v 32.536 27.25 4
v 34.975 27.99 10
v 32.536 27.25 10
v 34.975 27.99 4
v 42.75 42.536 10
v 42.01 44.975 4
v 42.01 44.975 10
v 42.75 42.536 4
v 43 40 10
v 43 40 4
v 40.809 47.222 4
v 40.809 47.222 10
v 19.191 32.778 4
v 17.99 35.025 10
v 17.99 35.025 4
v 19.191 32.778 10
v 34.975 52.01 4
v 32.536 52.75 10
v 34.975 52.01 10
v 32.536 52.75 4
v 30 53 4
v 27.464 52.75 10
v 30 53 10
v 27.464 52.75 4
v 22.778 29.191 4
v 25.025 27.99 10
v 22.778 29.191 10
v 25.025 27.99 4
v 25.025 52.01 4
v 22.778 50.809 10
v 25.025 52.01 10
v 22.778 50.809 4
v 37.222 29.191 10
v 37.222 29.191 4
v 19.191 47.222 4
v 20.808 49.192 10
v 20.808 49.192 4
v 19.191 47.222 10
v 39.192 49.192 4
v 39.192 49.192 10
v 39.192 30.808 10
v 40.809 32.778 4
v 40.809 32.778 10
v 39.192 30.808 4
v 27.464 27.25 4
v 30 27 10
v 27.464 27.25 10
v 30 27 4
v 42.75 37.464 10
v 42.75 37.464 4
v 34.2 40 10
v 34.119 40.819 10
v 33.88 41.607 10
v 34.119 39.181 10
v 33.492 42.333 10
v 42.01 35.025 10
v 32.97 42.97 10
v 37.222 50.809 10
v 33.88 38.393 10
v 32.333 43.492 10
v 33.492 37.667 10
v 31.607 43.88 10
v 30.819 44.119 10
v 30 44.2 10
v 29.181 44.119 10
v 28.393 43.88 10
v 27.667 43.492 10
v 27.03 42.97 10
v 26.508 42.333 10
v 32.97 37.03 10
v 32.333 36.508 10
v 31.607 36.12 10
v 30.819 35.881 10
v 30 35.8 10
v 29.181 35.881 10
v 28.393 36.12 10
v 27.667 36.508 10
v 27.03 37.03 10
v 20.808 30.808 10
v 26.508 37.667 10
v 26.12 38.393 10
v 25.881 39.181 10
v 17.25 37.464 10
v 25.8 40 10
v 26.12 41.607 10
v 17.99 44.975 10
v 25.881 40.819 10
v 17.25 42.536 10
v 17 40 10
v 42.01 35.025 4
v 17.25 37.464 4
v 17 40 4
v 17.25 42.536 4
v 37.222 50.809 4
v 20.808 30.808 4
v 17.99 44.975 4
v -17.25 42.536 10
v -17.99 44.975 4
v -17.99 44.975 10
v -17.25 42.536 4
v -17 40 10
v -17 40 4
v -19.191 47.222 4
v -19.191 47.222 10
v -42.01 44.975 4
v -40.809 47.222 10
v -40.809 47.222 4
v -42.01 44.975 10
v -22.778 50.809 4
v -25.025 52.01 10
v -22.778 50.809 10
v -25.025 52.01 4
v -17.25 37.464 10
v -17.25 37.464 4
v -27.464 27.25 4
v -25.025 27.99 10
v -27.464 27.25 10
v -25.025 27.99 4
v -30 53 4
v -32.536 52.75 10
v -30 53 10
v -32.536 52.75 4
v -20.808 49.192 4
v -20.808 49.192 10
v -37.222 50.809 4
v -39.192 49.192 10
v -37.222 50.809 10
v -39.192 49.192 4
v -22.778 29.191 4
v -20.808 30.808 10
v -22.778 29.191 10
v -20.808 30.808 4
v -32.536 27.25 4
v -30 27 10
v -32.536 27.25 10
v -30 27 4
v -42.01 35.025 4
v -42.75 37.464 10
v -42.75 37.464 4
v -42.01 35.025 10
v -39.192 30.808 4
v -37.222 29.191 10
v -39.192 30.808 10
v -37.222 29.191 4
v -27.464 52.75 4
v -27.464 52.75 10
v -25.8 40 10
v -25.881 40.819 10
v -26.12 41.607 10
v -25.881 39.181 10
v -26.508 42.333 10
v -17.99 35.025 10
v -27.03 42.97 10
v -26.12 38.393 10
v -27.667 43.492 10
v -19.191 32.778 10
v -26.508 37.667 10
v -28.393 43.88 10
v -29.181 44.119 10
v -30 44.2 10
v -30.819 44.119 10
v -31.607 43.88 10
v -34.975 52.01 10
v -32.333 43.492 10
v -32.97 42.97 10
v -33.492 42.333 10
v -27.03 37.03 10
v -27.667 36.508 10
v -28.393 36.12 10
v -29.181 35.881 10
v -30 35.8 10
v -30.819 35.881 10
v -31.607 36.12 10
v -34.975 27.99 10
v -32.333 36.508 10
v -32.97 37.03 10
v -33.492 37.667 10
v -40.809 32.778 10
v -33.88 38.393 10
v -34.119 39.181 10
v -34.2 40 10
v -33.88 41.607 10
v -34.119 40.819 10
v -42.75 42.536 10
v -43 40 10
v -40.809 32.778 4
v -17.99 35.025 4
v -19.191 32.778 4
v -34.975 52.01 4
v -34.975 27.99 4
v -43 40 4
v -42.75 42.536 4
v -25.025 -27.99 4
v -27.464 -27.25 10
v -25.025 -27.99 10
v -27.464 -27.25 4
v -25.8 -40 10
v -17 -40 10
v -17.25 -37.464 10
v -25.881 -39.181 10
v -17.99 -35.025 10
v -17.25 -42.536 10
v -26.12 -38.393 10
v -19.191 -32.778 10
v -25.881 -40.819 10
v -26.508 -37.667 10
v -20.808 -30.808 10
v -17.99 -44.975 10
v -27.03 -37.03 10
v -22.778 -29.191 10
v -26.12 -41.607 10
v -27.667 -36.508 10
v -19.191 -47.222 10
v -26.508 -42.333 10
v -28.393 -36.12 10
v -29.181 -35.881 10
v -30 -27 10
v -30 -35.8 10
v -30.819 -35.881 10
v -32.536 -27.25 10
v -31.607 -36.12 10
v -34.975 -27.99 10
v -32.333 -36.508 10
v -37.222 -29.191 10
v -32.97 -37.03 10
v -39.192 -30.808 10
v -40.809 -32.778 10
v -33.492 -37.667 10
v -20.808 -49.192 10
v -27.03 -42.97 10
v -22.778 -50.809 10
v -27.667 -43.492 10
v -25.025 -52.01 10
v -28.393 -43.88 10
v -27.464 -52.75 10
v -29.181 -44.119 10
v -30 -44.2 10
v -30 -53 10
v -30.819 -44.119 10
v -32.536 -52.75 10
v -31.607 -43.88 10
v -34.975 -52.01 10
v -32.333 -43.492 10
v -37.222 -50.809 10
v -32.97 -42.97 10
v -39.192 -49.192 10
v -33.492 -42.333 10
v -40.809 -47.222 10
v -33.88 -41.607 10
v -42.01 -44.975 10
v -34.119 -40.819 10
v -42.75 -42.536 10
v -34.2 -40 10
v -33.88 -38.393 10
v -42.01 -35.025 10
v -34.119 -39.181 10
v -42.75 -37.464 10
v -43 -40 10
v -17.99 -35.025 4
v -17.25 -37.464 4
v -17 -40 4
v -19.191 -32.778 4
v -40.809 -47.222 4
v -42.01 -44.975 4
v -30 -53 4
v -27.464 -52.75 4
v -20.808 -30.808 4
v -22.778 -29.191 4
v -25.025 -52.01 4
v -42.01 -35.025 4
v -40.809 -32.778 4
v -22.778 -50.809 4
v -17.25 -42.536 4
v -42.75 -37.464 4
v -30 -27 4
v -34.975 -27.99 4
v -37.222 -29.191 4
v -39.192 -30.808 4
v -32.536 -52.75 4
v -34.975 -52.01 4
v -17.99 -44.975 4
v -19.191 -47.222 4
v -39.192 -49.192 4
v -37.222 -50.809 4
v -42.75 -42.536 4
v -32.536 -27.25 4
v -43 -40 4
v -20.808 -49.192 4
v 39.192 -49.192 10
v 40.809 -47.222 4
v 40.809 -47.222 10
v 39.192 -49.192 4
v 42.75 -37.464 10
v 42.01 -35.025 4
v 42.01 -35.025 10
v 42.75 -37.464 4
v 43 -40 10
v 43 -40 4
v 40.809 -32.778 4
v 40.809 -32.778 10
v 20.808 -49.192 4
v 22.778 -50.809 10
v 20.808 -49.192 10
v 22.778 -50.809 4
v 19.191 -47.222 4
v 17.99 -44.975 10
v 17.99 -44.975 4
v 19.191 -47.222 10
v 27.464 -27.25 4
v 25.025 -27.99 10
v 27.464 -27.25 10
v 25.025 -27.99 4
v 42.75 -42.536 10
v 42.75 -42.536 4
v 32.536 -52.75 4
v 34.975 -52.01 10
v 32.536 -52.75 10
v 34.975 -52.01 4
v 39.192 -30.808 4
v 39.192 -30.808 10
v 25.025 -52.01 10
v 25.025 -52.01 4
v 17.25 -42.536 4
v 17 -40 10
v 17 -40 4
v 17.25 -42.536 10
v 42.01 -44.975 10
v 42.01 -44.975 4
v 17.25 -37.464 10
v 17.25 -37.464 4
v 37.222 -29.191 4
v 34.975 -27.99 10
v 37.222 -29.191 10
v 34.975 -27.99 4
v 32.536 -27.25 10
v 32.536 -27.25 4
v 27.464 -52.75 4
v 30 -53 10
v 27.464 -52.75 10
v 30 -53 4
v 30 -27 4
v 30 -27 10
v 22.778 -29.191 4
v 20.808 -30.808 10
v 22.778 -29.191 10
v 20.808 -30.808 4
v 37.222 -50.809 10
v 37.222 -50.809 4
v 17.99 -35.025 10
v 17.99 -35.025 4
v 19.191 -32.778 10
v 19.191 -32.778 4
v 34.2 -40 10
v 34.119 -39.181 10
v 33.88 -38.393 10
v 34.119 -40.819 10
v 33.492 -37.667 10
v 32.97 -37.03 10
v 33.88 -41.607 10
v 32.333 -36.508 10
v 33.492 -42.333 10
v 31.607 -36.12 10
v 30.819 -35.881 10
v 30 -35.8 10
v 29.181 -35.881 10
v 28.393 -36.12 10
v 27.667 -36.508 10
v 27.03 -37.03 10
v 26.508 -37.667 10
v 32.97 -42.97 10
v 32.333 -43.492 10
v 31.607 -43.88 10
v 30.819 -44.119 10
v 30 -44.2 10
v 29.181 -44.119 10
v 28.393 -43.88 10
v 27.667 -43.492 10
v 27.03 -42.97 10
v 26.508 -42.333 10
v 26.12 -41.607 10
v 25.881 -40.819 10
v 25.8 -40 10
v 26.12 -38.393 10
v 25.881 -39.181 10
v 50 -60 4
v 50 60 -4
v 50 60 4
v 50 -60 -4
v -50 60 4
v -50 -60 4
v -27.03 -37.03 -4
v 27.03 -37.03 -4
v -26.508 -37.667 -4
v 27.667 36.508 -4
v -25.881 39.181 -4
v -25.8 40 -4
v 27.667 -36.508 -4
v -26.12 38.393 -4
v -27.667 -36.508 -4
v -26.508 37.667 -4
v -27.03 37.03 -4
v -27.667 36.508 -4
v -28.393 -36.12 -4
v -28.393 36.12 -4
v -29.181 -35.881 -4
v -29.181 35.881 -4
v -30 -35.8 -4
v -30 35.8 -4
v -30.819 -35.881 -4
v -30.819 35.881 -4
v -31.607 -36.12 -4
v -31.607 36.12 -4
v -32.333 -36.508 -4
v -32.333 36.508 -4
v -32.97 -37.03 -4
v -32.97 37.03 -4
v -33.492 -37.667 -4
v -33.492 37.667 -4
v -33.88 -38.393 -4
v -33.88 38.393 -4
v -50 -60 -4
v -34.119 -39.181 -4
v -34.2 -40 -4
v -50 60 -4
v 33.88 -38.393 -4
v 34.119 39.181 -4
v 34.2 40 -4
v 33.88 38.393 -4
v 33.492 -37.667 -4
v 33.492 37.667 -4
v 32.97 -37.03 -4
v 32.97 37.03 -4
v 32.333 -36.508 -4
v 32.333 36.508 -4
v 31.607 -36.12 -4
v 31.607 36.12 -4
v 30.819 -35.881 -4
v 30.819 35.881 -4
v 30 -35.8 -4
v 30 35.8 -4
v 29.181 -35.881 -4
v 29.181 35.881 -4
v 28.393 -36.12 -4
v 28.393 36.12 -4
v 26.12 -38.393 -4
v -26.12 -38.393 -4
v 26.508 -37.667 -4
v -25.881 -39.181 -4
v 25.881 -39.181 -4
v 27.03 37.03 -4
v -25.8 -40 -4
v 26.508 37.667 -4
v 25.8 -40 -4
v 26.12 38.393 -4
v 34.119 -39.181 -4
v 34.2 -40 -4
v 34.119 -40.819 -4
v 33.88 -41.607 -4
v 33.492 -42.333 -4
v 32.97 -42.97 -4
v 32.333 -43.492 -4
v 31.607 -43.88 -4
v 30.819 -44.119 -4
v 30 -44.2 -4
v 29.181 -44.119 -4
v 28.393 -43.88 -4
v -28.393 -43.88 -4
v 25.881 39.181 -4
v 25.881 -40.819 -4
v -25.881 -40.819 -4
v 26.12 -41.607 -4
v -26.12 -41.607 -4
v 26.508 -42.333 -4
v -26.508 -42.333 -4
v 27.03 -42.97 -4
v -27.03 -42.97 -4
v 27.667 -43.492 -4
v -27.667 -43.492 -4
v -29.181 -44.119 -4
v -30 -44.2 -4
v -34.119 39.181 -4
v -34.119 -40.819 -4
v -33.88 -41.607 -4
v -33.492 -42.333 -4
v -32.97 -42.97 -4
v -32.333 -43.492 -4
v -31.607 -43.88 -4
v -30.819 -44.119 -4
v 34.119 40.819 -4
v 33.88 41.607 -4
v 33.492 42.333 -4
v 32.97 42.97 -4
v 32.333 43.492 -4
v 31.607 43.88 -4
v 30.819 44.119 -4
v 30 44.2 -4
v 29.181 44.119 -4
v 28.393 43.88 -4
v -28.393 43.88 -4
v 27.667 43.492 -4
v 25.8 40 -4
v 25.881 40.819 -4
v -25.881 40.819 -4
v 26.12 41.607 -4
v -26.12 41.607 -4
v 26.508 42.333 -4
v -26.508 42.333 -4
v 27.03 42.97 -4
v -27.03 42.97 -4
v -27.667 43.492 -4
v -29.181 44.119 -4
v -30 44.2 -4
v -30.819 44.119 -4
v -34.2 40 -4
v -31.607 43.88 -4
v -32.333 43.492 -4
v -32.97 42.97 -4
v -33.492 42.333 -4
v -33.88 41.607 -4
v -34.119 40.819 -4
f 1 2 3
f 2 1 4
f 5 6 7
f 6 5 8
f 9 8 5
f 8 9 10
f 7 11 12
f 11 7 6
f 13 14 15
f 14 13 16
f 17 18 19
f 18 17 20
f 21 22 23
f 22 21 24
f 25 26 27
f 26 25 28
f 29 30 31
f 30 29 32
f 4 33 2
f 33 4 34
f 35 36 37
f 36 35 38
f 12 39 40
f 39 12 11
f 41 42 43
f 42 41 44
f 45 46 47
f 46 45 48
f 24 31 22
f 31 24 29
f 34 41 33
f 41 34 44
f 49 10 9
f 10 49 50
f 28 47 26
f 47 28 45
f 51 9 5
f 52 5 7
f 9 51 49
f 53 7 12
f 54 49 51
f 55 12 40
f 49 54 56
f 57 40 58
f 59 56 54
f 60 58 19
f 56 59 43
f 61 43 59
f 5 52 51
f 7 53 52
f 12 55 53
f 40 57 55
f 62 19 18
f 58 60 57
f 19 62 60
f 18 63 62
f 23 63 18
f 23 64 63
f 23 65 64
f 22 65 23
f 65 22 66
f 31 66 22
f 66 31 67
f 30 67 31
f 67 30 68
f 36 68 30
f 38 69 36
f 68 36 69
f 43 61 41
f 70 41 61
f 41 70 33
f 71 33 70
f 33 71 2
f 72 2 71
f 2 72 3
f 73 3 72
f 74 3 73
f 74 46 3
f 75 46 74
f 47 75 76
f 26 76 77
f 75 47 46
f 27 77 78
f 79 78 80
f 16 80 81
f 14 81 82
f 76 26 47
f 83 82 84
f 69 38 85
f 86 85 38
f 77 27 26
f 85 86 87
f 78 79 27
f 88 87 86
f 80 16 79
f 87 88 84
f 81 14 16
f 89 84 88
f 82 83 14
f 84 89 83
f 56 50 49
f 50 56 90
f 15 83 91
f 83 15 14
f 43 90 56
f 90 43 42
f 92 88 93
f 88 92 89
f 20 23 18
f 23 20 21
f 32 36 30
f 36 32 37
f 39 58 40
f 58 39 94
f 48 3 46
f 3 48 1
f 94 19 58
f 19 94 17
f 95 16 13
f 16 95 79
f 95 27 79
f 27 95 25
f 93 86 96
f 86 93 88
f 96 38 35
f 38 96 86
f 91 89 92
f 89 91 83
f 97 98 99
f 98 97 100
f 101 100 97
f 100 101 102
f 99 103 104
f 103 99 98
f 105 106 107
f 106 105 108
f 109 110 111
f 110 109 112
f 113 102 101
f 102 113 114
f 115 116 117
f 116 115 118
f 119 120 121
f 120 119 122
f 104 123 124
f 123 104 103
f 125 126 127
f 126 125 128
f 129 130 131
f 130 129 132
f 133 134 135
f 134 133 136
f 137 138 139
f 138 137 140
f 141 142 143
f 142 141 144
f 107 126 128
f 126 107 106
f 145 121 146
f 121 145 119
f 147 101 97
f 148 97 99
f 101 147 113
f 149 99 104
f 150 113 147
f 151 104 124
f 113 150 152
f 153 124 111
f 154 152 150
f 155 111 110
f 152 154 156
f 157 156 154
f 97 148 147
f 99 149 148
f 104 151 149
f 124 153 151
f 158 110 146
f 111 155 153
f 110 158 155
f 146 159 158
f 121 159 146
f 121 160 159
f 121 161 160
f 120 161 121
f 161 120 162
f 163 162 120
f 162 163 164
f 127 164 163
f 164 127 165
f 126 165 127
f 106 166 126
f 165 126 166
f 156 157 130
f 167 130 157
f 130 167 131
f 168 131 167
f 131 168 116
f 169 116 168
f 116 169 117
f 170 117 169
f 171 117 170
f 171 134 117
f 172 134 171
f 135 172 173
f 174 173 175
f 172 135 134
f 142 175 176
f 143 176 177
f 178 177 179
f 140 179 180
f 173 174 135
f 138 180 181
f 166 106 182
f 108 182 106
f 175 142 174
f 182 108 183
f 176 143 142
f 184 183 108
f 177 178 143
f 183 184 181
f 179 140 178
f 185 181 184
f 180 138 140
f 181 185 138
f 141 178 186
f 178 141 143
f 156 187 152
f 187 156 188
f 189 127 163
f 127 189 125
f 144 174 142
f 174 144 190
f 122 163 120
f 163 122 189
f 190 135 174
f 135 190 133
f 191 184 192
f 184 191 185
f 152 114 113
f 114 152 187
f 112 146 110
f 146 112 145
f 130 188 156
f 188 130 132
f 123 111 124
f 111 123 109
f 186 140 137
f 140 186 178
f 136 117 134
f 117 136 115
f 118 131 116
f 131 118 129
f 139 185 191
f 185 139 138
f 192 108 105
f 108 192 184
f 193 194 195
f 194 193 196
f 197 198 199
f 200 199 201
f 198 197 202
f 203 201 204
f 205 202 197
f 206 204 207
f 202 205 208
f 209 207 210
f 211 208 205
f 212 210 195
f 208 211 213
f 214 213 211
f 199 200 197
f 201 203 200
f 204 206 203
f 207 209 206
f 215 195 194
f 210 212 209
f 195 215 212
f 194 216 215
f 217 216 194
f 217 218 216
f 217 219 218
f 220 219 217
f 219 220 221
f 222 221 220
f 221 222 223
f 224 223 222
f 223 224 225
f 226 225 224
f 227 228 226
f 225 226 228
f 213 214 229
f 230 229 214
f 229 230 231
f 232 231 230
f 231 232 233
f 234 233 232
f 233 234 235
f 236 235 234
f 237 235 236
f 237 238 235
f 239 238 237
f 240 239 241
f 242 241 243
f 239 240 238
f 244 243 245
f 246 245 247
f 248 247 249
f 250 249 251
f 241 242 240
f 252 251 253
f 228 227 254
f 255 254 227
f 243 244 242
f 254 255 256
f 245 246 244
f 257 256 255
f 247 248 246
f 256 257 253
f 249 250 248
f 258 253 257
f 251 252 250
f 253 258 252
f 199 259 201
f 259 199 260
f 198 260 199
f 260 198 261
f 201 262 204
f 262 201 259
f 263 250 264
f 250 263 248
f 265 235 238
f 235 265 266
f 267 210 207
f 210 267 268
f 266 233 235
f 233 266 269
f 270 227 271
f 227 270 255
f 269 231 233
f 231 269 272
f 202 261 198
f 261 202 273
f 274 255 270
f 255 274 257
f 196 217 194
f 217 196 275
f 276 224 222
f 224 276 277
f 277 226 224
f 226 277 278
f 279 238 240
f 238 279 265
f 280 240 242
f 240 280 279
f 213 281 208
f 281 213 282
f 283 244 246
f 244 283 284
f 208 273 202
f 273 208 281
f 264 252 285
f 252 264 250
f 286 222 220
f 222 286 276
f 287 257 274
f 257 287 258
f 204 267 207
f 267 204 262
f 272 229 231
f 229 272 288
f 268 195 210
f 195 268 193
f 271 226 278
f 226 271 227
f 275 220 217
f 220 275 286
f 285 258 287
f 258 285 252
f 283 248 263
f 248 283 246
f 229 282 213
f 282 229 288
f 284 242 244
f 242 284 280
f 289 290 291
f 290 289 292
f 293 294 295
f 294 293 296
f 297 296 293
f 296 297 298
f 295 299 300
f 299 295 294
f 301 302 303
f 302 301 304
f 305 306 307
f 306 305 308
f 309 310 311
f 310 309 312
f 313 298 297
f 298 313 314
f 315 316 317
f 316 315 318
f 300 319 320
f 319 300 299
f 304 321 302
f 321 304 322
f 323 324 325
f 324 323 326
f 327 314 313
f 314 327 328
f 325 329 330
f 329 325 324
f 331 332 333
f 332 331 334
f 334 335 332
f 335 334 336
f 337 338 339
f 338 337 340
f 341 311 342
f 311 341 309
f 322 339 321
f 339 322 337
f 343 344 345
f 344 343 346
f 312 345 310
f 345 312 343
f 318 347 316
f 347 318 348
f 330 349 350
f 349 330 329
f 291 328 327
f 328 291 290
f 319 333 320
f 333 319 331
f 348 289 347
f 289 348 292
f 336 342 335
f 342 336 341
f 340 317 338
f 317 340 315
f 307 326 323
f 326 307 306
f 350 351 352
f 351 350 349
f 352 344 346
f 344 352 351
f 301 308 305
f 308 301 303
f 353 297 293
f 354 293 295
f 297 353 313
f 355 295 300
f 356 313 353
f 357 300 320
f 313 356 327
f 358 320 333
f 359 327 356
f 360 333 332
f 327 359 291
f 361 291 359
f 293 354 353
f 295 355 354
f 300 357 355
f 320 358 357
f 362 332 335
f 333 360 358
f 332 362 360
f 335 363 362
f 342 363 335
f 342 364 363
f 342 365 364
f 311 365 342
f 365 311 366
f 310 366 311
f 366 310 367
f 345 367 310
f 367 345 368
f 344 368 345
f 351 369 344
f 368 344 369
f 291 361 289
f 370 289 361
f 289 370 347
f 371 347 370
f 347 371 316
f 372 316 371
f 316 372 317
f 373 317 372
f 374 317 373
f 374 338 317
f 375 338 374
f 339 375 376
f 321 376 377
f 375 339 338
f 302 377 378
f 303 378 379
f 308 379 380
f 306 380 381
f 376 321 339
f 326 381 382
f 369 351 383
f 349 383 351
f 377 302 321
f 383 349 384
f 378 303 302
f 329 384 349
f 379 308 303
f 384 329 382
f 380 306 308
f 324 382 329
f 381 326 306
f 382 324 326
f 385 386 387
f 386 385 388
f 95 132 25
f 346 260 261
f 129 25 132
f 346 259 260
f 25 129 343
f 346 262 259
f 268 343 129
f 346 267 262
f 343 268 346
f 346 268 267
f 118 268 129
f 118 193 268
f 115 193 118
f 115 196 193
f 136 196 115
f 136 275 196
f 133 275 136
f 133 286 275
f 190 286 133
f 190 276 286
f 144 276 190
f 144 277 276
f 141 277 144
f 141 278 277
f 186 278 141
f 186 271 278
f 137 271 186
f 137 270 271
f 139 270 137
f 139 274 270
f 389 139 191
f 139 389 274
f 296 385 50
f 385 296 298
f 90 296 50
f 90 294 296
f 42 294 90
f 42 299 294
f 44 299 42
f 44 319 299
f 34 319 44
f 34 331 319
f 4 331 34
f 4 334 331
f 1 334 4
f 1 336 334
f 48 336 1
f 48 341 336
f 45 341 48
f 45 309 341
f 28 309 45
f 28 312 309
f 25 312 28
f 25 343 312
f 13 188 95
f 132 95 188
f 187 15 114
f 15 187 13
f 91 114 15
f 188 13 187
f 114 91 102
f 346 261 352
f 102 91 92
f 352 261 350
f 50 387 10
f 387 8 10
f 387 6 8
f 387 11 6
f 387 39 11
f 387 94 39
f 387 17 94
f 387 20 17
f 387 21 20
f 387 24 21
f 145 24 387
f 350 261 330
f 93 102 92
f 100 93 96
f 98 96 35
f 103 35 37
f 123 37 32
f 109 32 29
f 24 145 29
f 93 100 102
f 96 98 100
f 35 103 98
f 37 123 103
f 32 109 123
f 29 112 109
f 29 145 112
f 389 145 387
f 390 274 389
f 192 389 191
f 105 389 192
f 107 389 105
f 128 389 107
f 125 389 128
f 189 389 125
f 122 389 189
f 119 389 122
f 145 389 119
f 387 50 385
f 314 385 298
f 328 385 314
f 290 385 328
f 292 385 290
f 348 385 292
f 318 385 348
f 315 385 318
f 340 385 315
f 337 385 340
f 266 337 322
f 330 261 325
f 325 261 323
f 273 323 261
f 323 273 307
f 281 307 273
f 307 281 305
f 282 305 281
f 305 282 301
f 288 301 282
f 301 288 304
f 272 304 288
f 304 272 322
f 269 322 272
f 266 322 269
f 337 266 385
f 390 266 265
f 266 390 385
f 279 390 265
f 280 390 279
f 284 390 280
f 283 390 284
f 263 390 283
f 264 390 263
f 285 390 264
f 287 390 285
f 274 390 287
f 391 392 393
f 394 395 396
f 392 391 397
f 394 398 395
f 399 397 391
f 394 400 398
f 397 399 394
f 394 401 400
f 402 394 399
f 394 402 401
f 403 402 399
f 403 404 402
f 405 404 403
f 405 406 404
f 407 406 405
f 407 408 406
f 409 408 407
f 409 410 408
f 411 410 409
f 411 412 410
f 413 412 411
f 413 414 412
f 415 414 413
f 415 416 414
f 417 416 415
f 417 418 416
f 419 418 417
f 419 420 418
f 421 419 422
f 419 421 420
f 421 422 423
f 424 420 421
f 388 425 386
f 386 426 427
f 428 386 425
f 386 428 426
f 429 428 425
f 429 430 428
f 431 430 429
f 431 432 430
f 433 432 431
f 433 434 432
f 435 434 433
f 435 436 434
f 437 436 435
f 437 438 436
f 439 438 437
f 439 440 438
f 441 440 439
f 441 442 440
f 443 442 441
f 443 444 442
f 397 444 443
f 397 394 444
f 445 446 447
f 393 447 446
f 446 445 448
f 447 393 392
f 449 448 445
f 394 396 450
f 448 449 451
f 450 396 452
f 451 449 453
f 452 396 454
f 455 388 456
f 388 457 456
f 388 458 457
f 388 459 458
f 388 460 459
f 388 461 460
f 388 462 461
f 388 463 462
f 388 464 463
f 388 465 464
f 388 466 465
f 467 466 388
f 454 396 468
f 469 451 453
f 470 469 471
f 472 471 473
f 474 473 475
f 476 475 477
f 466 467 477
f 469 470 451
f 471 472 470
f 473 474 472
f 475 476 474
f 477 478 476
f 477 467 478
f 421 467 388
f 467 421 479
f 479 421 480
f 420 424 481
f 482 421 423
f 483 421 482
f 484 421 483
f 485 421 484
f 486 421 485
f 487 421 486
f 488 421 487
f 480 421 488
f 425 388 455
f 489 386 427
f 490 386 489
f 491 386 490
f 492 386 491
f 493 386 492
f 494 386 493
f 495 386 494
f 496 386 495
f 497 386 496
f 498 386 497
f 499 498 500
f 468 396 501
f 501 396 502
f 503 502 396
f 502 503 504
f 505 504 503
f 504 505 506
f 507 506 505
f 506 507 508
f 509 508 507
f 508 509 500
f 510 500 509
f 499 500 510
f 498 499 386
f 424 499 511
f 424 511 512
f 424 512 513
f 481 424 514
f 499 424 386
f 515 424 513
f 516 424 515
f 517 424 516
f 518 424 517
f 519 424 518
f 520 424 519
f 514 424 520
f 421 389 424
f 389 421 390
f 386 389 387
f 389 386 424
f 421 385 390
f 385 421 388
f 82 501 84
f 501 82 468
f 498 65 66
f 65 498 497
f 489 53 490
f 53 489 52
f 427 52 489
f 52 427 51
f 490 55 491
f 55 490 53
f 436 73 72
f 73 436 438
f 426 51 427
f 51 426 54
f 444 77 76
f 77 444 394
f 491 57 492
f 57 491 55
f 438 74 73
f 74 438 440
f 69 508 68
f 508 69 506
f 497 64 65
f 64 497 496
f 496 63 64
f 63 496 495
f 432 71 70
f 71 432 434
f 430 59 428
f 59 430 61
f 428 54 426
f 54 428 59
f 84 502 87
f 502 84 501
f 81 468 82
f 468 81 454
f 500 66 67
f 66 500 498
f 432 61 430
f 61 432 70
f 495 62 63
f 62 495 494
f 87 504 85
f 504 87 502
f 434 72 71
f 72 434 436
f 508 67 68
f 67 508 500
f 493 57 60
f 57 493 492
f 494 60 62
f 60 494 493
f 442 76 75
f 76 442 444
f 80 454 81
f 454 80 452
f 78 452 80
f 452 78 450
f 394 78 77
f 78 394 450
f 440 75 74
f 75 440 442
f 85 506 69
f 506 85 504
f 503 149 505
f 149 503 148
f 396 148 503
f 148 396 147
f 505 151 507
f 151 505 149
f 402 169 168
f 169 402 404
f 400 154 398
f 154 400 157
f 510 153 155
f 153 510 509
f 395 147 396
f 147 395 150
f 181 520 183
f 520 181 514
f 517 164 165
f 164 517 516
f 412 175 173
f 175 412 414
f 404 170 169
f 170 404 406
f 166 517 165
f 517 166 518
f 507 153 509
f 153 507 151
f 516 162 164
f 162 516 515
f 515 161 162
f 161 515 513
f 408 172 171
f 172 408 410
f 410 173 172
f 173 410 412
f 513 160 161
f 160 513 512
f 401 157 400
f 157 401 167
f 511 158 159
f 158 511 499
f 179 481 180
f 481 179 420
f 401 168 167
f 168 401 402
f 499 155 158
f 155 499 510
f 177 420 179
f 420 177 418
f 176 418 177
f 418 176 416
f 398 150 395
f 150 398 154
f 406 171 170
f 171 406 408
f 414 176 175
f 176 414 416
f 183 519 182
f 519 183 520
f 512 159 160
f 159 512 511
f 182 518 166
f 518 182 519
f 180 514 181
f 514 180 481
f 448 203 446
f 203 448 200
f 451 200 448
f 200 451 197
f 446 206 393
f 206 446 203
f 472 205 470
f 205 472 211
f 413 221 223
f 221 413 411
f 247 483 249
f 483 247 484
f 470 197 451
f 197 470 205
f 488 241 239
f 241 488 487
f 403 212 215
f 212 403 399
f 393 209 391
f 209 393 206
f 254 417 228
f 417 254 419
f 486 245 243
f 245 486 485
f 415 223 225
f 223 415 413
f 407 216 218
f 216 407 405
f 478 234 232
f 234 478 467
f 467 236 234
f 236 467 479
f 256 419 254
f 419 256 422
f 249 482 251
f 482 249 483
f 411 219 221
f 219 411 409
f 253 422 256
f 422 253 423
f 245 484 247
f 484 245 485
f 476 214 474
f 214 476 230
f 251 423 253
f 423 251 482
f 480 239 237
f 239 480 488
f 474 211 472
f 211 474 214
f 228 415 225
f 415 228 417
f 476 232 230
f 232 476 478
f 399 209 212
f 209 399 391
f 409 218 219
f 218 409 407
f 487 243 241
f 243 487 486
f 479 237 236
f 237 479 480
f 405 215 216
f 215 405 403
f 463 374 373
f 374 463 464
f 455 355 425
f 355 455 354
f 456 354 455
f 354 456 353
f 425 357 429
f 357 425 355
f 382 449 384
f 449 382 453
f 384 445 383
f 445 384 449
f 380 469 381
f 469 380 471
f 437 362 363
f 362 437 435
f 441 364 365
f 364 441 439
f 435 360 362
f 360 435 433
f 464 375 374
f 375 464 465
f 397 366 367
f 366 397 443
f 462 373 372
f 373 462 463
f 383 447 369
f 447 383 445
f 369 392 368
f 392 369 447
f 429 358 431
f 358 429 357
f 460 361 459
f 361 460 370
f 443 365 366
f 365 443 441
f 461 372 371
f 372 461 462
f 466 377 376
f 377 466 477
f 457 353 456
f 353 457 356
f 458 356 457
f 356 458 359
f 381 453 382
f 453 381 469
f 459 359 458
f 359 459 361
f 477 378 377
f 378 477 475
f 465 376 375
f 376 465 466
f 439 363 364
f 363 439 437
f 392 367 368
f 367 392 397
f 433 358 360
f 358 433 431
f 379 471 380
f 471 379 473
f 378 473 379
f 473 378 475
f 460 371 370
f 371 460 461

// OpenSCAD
$fn = 32;

// ----------------------------------------------------------------------
// Anchor pads 100 x 120 x 14
// four corner bosses with anchor holes
// ----------------------------------------------------------------------

// --- parameters (mm) ---
plate = [100, 120, 8];  // base plate size (x, y, z)
pads = 4;               // boss count, one per corner
edge = 20;              // boss centre offset from the plate edge
boss_d = 26;            // boss diameter
boss_h = 6;             // boss height above the base plate
hole_d = 8.4;           // hole diameter

// --- derived feature positions (mm) ---
height = plate[2] + boss_h;      // = 14   overall height of the part
corner_x = plate[0] / 2 - edge;  // = 30   boss centre X
corner_y = plate[1] / 2 - edge;  // = 40   boss centre Y
feature_centers = [
  [corner_x, corner_y],
  [-corner_x, corner_y],
  [-corner_x, -corner_y],
  [corner_x, -corner_y]
];   // boss centres, anchor holes are drilled there

// base plate, four bosses standing on it, anchor holes all the way through
difference() {
  union() {
    cube(plate, center = true);
    for (centre = feature_centers)
      translate([centre[0], centre[1], plate[2] / 2 - 1])
        cylinder(d = boss_d, h = boss_h + 1);
  }
  for (centre = feature_centers)
    translate([centre[0], centre[1], -height])
      cylinder(d = hole_d, h = 2 * height + 2);  // through boss and plate
}
